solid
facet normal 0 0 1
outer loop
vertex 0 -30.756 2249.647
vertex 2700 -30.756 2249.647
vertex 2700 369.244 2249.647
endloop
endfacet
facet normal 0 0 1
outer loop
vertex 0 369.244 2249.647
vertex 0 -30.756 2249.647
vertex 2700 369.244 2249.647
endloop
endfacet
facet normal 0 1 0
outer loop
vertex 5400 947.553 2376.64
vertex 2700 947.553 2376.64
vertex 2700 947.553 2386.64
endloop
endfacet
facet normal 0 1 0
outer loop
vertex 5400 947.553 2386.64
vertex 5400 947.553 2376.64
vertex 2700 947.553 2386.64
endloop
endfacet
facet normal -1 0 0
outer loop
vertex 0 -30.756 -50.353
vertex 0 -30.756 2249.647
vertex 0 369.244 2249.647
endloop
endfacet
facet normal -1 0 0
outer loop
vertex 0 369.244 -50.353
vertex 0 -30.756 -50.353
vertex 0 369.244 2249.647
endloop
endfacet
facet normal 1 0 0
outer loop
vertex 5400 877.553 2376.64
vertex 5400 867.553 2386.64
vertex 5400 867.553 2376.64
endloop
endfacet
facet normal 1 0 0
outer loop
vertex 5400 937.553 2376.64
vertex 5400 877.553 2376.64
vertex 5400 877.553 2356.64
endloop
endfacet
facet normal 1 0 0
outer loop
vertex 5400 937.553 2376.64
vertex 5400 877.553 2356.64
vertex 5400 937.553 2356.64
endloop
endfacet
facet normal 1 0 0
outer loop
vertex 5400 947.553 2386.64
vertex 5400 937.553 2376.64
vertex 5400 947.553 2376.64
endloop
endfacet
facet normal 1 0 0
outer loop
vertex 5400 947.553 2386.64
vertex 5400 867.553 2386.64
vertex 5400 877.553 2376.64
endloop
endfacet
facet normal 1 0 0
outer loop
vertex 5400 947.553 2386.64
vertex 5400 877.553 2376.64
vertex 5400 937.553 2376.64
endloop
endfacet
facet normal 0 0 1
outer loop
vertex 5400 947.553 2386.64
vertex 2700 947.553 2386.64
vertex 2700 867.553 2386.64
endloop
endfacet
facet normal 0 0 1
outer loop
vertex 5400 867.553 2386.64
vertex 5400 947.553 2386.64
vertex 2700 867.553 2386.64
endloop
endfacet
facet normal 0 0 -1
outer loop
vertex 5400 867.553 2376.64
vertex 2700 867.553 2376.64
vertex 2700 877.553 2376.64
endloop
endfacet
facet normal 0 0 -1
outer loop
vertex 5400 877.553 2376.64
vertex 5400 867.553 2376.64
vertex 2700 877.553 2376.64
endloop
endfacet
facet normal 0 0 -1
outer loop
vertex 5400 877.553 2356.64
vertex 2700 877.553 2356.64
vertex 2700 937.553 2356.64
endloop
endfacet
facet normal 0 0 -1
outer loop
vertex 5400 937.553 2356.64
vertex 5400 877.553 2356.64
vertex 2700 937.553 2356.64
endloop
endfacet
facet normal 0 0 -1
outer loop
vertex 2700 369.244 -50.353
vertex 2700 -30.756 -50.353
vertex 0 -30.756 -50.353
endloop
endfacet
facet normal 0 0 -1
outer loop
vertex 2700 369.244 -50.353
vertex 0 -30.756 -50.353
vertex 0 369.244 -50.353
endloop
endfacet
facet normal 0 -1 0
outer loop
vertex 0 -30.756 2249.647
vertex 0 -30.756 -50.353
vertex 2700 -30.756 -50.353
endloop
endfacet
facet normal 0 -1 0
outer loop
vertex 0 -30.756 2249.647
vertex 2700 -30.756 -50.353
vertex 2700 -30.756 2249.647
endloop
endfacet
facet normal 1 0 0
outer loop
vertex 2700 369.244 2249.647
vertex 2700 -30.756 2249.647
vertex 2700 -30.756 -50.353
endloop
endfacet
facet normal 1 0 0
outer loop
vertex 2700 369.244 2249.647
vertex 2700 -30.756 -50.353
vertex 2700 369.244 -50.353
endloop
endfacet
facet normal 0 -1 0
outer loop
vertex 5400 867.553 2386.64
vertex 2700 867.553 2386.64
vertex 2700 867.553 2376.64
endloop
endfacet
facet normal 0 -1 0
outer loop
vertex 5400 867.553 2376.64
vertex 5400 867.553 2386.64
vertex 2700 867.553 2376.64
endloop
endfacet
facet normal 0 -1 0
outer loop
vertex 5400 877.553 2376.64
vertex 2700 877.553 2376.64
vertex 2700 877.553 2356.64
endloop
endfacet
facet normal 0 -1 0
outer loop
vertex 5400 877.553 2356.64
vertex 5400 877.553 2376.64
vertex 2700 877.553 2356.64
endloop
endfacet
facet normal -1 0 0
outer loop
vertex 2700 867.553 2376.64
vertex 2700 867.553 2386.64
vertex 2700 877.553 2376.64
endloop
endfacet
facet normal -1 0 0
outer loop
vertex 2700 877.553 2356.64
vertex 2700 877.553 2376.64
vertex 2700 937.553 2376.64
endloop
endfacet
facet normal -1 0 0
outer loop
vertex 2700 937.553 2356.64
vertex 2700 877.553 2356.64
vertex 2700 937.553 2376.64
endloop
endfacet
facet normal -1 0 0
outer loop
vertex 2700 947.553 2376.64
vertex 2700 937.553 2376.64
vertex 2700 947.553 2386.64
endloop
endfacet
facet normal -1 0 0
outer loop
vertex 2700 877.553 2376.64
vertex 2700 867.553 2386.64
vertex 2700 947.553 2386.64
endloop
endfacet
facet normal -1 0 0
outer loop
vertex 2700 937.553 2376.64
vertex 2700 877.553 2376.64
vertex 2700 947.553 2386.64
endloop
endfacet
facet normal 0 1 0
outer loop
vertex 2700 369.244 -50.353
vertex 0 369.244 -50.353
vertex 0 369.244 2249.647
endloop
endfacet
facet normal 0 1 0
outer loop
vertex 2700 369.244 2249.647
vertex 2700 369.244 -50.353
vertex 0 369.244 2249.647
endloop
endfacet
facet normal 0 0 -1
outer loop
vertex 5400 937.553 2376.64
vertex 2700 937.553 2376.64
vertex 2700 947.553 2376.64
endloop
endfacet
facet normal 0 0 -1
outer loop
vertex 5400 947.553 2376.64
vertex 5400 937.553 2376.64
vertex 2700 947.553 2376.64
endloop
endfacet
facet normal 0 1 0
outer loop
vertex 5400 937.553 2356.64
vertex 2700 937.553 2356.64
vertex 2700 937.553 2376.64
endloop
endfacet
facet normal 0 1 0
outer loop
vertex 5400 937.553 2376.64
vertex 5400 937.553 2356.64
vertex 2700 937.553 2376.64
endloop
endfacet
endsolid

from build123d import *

# Parameters (mm, degrees)
F0_W     = 400
F0_H     = 2300
F1_DEPTH = 2700
F3_DEPTH = 2700


with BuildPart() as f1:
    # F0 (on Right) → F1 (new body)
    with BuildSketch(Plane.YZ):
        with Locations((169.243951, 1099.647177)):
            Rectangle(F0_W, F0_H)
    extrude(amount=F1_DEPTH)


with BuildPart() as f3:
    # F2 (on face) → F3 (new body)
    with BuildSketch(Plane.YZ.offset(2700)):
        Polygon((947.552996, 2386.640081), (867.552996, 2386.640081), (867.552996, 2376.640081), (877.552996, 2376.640081), (877.552996, 2356.640081), (937.552996, 2356.640081), (937.552996, 2376.640081), (947.552996, 2376.640081), align=None)
    extrude(amount=F3_DEPTH)


solid = Compound([f1.part, f3.part])
